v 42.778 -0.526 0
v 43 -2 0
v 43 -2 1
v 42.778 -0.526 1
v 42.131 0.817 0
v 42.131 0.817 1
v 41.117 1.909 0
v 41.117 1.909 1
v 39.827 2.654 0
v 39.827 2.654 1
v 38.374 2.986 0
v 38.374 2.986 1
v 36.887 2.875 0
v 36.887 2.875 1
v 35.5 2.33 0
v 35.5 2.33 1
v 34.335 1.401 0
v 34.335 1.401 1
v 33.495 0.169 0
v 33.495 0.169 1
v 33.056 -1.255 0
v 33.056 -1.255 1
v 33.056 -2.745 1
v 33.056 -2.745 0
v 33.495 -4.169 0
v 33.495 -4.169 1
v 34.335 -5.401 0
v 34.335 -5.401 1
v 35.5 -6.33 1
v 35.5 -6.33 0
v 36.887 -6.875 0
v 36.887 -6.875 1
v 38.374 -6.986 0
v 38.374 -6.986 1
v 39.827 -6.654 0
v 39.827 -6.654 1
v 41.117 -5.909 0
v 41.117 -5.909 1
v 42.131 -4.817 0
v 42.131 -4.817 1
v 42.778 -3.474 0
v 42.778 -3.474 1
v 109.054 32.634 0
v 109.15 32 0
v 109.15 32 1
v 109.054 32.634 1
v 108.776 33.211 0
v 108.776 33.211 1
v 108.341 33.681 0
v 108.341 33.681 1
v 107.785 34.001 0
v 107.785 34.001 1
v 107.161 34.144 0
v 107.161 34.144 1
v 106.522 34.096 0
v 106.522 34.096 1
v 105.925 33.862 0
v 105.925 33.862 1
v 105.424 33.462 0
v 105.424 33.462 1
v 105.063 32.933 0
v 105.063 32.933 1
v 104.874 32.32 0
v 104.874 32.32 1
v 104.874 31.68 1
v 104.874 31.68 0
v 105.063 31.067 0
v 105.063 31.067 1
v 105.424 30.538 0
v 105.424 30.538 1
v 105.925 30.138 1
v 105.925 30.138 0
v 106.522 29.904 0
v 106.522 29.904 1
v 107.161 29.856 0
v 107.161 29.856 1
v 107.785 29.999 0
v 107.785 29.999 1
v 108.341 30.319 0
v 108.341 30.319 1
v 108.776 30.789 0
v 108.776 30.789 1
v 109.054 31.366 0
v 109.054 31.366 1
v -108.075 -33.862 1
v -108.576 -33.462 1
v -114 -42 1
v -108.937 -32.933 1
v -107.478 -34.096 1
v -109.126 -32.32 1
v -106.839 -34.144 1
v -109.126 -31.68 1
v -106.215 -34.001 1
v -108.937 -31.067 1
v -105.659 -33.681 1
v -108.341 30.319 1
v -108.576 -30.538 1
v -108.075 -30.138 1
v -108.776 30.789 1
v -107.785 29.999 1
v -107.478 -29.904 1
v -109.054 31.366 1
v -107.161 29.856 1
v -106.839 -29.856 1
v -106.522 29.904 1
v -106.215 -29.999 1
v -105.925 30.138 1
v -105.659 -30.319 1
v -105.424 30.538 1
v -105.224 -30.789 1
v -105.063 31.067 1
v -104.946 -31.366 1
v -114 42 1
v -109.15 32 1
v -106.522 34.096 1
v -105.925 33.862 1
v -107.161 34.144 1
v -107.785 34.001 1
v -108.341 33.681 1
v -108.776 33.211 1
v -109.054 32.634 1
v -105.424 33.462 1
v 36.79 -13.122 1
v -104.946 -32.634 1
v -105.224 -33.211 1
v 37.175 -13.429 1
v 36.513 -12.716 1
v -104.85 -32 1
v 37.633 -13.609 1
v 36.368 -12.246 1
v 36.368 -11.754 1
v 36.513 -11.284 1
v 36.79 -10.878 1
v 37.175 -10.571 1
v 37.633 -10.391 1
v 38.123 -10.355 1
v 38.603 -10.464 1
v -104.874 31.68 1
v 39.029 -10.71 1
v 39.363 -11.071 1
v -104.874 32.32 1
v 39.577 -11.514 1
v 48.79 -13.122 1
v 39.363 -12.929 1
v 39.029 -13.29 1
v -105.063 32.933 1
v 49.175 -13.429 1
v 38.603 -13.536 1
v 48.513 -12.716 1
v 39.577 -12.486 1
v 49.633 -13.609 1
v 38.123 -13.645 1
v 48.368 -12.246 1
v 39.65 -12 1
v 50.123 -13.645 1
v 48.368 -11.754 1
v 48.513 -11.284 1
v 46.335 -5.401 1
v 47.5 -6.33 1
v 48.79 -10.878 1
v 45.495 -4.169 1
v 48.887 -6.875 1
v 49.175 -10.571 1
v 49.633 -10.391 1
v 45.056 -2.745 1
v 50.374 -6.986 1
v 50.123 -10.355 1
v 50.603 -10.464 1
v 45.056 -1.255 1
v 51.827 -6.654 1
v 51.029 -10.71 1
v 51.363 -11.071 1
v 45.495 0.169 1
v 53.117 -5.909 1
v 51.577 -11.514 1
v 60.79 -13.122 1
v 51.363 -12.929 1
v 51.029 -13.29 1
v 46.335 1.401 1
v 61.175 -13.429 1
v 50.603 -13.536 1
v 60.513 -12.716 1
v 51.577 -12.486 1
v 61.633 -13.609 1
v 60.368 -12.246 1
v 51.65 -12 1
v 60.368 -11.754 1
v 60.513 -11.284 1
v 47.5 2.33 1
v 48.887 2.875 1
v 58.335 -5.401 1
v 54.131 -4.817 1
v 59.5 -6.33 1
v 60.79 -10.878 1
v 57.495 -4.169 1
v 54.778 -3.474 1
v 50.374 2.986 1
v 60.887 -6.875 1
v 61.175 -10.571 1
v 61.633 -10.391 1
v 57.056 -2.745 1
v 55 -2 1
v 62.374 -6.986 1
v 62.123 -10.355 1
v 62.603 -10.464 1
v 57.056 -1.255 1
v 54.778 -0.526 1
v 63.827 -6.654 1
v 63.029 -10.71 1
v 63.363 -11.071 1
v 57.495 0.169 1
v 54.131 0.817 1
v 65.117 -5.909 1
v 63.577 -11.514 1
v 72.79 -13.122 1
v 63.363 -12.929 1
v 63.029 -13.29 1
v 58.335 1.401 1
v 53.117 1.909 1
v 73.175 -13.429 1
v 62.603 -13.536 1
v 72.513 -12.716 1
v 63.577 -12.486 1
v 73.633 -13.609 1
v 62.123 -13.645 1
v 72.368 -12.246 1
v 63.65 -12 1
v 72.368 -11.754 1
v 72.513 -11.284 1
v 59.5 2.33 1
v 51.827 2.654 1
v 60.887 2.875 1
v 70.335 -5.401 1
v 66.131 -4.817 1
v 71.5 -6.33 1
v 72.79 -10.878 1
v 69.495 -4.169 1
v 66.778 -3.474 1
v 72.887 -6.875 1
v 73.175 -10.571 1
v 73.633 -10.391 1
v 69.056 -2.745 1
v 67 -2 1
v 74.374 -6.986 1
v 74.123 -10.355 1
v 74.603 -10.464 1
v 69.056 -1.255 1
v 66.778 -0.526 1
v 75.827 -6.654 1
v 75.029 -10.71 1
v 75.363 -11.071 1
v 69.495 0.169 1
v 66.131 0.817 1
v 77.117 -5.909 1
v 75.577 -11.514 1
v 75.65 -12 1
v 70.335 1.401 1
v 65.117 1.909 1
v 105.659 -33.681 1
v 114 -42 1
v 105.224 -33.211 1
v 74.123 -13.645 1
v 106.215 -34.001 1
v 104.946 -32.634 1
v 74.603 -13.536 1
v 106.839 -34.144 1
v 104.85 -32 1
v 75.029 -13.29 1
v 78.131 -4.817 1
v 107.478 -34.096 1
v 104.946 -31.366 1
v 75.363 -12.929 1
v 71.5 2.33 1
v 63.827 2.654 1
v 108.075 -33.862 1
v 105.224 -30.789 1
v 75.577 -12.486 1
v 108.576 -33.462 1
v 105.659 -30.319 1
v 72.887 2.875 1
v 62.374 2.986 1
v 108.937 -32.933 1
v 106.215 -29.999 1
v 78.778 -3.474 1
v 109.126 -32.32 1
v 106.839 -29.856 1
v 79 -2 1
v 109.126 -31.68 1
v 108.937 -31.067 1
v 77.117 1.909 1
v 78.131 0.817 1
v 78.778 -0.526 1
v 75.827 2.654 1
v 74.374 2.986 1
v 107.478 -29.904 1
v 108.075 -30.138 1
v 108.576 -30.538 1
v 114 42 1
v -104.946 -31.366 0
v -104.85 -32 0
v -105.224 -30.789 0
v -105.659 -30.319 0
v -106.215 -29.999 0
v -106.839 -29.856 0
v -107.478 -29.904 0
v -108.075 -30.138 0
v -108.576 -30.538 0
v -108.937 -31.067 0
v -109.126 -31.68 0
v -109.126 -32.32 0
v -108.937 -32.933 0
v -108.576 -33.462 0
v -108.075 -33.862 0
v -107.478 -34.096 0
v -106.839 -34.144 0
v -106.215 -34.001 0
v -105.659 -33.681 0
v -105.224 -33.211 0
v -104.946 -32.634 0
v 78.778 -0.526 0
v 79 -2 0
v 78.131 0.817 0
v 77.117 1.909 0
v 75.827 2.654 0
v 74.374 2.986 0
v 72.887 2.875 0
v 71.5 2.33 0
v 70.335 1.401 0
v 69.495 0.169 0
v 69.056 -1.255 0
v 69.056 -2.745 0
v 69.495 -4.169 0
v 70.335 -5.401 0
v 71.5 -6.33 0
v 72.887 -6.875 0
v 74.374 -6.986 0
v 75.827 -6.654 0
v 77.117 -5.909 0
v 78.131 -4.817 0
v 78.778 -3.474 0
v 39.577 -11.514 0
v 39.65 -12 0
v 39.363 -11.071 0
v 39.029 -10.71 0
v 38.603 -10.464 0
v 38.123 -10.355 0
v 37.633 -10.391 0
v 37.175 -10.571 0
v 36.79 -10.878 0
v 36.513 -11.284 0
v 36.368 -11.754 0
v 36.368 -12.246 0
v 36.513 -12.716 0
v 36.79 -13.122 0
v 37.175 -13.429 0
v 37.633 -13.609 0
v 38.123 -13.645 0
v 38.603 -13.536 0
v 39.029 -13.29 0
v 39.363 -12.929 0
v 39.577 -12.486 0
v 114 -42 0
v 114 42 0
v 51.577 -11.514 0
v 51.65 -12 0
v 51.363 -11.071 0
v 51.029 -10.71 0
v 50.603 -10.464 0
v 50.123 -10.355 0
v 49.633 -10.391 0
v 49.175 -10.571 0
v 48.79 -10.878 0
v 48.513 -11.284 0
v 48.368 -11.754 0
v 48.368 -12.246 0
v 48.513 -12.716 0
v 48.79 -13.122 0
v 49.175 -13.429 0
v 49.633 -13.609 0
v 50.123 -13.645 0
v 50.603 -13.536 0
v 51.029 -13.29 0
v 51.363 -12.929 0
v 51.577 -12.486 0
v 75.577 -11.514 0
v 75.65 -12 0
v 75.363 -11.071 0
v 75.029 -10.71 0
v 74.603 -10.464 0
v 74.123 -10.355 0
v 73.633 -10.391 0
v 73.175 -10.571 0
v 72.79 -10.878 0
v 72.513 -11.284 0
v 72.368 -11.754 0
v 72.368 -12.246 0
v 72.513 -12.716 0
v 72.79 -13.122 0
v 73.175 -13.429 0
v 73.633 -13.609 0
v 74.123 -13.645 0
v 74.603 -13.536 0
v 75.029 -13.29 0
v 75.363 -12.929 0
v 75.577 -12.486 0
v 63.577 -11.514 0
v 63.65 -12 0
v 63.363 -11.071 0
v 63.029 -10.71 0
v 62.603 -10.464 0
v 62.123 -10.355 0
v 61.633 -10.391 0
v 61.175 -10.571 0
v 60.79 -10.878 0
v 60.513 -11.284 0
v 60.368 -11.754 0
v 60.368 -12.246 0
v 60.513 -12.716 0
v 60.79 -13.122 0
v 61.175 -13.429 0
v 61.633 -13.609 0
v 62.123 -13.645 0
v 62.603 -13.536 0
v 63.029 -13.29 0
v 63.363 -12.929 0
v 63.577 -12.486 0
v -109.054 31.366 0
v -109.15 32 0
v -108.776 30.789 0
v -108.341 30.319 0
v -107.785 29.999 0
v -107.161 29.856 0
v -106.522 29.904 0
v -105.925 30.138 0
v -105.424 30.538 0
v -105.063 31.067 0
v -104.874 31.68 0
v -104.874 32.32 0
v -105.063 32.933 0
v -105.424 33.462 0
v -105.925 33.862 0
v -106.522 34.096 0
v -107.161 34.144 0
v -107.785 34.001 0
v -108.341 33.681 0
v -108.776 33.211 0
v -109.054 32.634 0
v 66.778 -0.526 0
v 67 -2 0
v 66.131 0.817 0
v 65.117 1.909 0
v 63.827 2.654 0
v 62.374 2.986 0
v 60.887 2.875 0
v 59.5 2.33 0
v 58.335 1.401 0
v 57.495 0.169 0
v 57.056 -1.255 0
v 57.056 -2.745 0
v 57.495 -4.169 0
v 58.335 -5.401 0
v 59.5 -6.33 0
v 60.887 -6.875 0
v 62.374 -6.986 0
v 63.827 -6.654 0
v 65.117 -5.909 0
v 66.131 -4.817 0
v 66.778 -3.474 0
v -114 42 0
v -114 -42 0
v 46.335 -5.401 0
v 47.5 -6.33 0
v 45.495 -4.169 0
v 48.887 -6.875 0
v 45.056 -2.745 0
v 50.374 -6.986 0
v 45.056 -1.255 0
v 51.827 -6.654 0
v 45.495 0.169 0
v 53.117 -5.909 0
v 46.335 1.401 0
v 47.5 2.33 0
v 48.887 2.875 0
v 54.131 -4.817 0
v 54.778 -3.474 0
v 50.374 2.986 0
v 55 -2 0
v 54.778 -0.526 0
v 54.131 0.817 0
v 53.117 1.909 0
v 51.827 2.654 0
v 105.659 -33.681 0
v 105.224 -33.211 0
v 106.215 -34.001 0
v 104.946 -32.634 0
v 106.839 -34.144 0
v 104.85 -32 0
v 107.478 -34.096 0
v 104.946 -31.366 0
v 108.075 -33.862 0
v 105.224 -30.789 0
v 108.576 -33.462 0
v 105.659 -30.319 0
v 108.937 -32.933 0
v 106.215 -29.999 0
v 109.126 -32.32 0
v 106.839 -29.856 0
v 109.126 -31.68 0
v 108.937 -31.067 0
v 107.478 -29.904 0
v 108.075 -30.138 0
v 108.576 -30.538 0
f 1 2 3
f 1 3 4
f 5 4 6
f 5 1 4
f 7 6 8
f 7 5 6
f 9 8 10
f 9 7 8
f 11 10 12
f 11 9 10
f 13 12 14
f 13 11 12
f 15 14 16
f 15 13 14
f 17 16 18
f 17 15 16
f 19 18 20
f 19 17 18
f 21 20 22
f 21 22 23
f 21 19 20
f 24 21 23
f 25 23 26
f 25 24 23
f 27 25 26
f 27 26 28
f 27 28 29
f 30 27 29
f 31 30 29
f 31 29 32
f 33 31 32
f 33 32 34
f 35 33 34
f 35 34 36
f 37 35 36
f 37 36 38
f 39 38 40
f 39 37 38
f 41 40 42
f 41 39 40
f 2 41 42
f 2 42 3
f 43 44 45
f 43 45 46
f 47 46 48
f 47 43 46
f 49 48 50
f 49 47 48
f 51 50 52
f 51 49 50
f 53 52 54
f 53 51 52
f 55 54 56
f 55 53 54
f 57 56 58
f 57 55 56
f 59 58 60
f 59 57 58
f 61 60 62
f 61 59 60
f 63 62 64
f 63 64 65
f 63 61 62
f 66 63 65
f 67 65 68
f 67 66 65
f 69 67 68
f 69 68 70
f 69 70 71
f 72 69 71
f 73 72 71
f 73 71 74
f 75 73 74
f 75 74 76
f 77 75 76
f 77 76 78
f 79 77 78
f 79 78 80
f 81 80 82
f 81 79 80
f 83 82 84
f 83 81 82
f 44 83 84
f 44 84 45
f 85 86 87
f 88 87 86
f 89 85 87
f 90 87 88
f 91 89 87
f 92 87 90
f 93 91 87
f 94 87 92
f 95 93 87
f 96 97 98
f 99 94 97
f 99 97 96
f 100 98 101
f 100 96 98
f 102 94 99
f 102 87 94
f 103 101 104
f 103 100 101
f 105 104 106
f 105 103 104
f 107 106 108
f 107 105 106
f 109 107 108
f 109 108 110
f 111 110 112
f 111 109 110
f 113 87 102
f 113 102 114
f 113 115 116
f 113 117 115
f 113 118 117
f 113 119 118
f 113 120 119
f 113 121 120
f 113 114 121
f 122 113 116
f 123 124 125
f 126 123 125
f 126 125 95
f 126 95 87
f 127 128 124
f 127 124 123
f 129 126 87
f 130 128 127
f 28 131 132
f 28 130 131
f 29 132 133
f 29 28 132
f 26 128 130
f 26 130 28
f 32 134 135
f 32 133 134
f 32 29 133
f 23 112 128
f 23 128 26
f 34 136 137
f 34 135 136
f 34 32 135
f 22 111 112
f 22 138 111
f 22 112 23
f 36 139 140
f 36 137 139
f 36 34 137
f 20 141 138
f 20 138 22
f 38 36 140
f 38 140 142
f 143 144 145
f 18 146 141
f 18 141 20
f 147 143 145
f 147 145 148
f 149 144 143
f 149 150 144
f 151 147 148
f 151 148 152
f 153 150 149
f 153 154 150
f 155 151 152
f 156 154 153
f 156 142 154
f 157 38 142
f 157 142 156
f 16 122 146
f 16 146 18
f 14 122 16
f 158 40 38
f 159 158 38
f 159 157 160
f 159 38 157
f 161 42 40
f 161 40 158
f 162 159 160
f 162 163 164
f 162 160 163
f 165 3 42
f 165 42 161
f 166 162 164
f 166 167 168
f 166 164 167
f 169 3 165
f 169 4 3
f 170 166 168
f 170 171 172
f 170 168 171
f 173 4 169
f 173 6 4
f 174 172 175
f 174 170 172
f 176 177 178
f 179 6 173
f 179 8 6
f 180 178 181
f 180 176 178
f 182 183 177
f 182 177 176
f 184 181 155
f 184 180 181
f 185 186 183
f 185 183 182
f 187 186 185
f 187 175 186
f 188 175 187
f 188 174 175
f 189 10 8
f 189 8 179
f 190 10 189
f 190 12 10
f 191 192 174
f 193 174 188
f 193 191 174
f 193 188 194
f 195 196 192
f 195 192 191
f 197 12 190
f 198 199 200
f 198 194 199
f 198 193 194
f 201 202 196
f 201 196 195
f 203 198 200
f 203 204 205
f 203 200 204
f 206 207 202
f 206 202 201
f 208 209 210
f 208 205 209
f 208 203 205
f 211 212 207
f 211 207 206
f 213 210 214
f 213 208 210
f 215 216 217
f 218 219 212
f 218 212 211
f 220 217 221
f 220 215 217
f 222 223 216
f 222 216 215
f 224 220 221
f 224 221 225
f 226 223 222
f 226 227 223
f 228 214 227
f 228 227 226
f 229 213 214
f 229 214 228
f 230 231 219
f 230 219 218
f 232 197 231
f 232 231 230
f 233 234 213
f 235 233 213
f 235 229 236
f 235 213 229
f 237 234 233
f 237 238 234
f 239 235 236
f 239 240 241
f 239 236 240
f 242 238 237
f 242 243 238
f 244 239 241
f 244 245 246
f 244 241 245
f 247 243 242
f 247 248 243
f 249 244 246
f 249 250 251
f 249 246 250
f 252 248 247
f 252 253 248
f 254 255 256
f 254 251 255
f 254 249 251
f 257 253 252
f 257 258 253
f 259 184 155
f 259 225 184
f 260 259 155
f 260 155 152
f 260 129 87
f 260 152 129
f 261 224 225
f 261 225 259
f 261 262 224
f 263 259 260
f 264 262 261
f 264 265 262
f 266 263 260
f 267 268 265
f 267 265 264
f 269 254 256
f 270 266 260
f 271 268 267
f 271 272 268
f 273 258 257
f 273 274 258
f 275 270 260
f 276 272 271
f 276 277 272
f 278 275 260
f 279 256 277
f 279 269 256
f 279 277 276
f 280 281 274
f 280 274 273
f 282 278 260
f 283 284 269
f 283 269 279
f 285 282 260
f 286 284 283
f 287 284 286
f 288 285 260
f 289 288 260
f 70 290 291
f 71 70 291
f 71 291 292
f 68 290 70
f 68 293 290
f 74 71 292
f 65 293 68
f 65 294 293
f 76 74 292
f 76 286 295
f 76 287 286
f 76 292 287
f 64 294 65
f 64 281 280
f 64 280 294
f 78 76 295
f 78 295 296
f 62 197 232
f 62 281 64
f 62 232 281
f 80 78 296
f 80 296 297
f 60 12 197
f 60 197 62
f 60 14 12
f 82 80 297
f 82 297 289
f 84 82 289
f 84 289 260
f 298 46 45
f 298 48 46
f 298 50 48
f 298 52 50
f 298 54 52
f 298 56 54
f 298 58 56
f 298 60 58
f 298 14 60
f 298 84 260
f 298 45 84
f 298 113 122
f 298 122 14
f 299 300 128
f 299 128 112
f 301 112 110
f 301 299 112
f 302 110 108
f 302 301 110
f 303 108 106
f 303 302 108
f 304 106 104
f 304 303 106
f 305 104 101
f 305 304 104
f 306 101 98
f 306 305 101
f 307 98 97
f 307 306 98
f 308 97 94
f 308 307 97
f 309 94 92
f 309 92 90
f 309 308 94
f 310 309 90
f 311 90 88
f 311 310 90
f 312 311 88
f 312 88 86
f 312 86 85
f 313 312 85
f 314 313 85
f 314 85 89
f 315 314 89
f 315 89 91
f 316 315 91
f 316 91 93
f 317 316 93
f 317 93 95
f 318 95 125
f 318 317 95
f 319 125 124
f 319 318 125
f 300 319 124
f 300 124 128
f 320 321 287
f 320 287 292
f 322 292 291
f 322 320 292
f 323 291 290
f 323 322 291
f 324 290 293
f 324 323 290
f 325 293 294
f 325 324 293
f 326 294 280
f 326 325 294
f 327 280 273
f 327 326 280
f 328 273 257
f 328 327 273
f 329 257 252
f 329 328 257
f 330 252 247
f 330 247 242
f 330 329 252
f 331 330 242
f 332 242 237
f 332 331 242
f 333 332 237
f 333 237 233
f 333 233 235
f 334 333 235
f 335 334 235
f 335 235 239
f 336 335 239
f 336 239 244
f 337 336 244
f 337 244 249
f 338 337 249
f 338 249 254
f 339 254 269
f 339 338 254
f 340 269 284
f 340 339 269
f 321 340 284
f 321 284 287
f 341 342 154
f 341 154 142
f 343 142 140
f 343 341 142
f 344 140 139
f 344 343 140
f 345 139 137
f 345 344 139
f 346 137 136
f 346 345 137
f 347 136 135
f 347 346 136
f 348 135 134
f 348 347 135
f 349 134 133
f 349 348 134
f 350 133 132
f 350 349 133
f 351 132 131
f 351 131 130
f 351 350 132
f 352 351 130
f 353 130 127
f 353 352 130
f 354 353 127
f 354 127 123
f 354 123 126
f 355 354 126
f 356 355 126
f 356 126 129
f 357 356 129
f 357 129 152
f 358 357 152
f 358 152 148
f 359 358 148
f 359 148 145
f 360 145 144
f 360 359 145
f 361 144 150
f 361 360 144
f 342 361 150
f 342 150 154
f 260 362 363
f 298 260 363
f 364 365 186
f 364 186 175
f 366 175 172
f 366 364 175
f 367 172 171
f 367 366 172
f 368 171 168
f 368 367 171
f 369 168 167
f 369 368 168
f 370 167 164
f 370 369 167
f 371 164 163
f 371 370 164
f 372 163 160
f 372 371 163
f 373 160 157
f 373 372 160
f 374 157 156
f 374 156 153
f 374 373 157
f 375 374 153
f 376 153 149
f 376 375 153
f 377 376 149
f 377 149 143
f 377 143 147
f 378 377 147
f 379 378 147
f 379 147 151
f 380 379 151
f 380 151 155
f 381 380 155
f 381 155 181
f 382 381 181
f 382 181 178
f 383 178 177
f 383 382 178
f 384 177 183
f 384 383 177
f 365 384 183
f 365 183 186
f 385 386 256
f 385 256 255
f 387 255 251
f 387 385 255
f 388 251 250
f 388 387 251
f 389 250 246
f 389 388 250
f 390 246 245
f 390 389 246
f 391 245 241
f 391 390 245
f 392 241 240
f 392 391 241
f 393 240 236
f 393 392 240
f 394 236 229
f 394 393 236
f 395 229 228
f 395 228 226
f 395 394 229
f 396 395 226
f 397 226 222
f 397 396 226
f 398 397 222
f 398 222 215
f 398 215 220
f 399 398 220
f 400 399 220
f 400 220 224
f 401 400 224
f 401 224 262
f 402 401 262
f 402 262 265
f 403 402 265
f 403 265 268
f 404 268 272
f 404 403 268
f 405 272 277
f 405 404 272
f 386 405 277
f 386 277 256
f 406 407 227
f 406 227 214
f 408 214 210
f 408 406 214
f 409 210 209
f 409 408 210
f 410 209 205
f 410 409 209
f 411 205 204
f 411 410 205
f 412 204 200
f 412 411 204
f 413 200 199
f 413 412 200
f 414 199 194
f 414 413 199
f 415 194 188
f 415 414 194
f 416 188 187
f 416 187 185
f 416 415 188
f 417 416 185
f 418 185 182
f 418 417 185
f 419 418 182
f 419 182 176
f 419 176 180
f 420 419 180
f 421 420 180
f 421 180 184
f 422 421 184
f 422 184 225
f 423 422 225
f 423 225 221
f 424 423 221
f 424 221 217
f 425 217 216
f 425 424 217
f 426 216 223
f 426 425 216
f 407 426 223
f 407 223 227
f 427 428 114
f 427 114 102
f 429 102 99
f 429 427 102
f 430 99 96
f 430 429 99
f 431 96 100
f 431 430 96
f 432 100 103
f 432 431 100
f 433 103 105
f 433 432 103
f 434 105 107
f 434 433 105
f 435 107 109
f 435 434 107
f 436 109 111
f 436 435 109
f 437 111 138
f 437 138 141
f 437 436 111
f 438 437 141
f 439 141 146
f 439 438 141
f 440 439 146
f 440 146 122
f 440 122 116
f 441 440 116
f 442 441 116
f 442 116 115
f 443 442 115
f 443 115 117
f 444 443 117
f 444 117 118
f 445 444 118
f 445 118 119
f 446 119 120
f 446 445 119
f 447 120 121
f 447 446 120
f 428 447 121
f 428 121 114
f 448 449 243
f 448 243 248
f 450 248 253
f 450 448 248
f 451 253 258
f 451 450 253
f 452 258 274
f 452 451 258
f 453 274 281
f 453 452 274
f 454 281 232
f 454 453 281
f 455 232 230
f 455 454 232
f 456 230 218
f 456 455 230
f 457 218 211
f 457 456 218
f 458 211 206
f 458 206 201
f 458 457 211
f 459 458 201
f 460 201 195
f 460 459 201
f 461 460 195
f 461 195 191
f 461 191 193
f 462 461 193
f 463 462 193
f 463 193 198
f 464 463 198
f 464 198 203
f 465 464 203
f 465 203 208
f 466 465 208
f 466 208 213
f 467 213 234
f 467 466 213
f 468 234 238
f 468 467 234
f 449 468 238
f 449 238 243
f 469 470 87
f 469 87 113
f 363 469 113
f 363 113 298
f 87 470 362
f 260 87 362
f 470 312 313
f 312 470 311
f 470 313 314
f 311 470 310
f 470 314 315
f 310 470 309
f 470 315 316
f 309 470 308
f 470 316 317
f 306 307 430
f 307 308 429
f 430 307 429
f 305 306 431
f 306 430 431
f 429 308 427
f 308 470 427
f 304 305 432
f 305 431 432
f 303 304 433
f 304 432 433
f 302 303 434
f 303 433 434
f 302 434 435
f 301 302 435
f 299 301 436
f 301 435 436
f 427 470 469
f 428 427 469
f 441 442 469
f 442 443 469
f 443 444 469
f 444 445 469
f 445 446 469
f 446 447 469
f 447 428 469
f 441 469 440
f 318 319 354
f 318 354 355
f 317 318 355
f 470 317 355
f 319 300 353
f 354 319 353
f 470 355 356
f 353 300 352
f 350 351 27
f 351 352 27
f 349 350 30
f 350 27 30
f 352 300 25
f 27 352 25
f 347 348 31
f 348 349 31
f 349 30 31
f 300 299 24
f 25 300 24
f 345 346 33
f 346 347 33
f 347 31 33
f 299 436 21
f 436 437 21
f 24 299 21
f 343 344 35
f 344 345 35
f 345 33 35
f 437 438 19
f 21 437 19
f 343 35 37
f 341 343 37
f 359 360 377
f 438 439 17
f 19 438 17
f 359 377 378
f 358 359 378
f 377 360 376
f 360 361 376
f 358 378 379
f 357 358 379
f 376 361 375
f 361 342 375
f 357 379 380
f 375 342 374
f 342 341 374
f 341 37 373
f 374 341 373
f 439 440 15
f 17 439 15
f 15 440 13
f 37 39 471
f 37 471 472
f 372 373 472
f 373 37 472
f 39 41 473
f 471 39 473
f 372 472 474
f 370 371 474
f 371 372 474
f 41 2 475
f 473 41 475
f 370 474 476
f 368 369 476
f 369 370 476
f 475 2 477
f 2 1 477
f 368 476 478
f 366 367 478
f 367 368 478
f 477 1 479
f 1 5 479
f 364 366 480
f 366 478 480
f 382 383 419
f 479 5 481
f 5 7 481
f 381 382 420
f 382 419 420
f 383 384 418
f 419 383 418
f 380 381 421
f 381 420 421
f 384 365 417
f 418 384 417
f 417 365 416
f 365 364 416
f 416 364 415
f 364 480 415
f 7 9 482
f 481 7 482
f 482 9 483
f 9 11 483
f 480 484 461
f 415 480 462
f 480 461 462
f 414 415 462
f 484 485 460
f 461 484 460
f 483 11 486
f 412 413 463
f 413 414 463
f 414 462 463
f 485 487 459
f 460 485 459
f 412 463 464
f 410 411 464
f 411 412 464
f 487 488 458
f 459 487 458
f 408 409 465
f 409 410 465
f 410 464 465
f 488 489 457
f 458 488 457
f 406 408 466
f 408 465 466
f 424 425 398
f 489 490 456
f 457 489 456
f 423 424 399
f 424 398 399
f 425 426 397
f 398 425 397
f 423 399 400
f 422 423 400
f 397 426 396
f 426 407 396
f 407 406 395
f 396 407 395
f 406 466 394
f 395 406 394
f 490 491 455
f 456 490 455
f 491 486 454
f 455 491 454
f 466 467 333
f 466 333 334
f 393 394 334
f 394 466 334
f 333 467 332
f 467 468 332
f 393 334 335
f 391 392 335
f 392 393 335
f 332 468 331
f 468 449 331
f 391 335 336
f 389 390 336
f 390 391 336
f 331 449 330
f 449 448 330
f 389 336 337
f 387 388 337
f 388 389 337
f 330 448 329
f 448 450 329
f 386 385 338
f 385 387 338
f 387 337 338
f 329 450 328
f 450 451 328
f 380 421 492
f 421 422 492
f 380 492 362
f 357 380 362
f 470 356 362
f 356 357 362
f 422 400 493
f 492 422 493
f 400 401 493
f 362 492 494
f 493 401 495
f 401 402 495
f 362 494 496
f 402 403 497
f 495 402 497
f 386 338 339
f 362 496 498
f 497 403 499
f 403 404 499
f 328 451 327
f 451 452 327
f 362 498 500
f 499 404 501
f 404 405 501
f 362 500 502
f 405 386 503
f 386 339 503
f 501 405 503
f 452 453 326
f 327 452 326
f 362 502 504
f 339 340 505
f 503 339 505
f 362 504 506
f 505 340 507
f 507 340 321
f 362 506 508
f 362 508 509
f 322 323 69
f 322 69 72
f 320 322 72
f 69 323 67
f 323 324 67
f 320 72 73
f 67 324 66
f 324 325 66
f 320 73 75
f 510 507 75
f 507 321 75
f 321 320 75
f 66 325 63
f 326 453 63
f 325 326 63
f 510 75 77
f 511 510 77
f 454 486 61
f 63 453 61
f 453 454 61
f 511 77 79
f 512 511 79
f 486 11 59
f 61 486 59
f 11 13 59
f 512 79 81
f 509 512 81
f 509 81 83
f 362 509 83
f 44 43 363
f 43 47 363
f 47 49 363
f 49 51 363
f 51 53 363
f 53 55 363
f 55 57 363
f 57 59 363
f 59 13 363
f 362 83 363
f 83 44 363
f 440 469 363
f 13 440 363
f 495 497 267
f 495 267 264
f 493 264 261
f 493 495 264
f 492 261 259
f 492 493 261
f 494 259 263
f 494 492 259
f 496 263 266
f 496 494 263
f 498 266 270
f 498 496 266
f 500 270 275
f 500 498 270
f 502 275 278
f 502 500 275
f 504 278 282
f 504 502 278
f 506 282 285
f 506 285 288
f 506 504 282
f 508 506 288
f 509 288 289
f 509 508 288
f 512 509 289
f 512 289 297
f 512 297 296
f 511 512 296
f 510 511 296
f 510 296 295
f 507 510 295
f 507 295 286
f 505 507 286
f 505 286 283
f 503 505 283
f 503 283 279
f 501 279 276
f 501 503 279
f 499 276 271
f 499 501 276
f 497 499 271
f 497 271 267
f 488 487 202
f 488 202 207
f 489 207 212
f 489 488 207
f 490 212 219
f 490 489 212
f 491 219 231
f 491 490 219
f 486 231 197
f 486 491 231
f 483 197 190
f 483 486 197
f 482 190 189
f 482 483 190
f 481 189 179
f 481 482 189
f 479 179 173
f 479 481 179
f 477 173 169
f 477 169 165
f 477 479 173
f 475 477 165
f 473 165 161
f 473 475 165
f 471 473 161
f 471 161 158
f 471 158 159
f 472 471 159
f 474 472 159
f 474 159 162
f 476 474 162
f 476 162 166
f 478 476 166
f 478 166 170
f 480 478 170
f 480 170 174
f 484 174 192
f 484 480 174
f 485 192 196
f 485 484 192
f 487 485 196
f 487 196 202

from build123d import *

# Parameters (mm, degrees)
SKETCH_1_W      = 228
SKETCH_1_H      = 84
SKETCH_1_R      = 5
SKETCH_1_R_2    = 1.65
SKETCH_1_R_3    = 2.15
EXTRUDE_1_DEPTH = 1


with BuildPart() as part:
    # Эскиз1 → Вытянуть1 (new body)
    with BuildSketch(Plane.XY):
        Rectangle(SKETCH_1_W, SKETCH_1_H)
        with Locations((74, -2)):
            Circle(SKETCH_1_R, mode=Mode.SUBTRACT)
        with Locations((74, -12)):
            Circle(SKETCH_1_R_2, mode=Mode.SUBTRACT)
        with Locations((62, -2)):
            Circle(SKETCH_1_R, mode=Mode.SUBTRACT)
        with Locations((62, -12)):
            Circle(SKETCH_1_R_2, mode=Mode.SUBTRACT)
        with Locations((50, -2)):
            Circle(SKETCH_1_R, mode=Mode.SUBTRACT)
        with Locations((50, -12)):
            Circle(SKETCH_1_R_2, mode=Mode.SUBTRACT)
        with Locations((38, -2)):
            Circle(SKETCH_1_R, mode=Mode.SUBTRACT)
        with Locations((38, -12)):
            Circle(SKETCH_1_R_2, mode=Mode.SUBTRACT)
        with Locations((107, 32)):
            Circle(SKETCH_1_R_3, mode=Mode.SUBTRACT)
        with Locations(Location((-107, 32, 0), (0, 0, 180))):
            Circle(SKETCH_1_R_3, mode=Mode.SUBTRACT)
        with Locations((-107, -32)):
            Circle(SKETCH_1_R_3, mode=Mode.SUBTRACT)
        with Locations(Location((107, -32, 0), (0, 0, 180))):
            Circle(SKETCH_1_R_3, mode=Mode.SUBTRACT)
    extrude(amount=EXTRUDE_1_DEPTH)


solid = part.part
